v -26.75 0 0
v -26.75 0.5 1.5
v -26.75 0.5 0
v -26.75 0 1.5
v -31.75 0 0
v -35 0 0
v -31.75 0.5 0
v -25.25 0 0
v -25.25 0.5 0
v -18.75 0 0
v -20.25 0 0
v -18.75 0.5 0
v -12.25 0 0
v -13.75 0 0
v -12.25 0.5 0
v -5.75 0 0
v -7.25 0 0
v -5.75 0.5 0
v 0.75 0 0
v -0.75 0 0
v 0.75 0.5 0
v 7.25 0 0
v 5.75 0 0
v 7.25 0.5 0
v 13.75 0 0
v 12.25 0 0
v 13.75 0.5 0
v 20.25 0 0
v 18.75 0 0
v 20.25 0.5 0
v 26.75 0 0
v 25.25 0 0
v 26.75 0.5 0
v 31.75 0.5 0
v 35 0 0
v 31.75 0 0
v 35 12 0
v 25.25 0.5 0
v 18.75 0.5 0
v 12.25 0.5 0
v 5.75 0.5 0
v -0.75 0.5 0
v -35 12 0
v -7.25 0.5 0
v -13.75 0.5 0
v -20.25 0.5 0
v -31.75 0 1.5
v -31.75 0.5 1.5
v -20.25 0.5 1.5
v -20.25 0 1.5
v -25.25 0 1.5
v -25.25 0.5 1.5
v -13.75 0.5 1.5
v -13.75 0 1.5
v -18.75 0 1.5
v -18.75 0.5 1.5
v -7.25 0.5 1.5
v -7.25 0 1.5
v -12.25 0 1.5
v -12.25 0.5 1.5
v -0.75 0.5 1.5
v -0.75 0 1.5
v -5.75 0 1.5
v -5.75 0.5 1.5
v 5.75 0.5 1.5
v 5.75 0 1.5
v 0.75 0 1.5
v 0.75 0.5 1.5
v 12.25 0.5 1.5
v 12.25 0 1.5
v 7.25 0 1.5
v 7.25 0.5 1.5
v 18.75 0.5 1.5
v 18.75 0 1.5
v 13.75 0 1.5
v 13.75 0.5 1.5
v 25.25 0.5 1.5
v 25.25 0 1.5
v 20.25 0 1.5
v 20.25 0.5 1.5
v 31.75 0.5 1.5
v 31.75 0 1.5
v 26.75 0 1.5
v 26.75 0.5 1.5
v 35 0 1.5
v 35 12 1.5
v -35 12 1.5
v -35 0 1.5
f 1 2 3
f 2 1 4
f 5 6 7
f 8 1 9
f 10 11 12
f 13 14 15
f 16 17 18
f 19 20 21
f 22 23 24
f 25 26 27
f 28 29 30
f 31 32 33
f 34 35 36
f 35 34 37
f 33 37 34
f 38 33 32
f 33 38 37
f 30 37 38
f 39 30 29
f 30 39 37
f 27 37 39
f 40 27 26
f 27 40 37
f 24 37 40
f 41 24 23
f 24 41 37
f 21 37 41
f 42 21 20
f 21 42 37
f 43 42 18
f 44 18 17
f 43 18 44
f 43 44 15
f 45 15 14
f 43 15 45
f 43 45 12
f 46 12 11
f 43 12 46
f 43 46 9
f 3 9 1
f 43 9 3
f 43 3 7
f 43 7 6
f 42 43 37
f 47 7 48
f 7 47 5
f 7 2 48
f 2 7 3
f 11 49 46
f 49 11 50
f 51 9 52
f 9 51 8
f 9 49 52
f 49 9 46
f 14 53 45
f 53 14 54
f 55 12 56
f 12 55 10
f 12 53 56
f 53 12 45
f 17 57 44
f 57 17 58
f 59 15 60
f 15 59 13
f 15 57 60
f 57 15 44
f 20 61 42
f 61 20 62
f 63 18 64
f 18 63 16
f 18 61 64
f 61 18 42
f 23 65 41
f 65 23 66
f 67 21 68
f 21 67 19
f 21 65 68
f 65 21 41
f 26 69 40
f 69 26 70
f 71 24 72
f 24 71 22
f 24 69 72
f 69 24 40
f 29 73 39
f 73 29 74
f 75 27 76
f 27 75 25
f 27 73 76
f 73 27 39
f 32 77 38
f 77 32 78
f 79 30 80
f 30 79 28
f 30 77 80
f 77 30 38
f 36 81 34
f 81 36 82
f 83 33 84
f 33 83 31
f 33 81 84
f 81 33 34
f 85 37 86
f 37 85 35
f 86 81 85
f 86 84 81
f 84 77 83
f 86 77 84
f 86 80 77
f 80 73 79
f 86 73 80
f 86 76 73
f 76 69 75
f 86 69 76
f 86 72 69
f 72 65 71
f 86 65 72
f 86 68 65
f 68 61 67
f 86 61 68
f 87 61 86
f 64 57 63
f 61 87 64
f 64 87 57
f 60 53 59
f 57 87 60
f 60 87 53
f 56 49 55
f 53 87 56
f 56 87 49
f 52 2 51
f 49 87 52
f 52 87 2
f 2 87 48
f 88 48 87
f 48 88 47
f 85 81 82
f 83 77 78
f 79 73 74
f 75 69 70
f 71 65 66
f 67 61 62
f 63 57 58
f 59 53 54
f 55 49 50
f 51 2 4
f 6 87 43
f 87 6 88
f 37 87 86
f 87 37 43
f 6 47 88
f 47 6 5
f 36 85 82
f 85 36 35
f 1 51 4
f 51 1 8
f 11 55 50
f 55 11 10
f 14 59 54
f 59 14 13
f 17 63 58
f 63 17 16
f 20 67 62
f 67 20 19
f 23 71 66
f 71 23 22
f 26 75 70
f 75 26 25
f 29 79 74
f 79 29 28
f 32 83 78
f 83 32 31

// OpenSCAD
// 10-well agarose gel comb - printed lying flat
// Units: mm

plate_t      = 1.5;   // plate thickness (Z)
spine_l      = 70;    // spine length (X)
spine_w      = 12;    // spine width (Y)
teeth_n      = 10;    // number of teeth
teeth_w      = 5;     // tooth width (X)
teeth_l      = 12;    // tooth length (Y)
teeth_gap    = 1.5;   // gap between teeth (X)
overcut      = 0.5;   // cutter overshoot past faces

$fn = 64;

pitch = teeth_w + teeth_gap;
x0    = -(teeth_n - 1) * pitch / 2;   // first tooth centre X

difference() {
    // Spine
    translate([-spine_l / 2, 0, 0])
        cube([spine_l, spine_w, plate_t]);

    // Teeth
    for (i = [0 : teeth_n - 1])
        translate([x0 + i * pitch - teeth_w / 2, -teeth_l, 0])
            cube([teeth_w, teeth_l + overcut, plate_t + overcut]);
}
